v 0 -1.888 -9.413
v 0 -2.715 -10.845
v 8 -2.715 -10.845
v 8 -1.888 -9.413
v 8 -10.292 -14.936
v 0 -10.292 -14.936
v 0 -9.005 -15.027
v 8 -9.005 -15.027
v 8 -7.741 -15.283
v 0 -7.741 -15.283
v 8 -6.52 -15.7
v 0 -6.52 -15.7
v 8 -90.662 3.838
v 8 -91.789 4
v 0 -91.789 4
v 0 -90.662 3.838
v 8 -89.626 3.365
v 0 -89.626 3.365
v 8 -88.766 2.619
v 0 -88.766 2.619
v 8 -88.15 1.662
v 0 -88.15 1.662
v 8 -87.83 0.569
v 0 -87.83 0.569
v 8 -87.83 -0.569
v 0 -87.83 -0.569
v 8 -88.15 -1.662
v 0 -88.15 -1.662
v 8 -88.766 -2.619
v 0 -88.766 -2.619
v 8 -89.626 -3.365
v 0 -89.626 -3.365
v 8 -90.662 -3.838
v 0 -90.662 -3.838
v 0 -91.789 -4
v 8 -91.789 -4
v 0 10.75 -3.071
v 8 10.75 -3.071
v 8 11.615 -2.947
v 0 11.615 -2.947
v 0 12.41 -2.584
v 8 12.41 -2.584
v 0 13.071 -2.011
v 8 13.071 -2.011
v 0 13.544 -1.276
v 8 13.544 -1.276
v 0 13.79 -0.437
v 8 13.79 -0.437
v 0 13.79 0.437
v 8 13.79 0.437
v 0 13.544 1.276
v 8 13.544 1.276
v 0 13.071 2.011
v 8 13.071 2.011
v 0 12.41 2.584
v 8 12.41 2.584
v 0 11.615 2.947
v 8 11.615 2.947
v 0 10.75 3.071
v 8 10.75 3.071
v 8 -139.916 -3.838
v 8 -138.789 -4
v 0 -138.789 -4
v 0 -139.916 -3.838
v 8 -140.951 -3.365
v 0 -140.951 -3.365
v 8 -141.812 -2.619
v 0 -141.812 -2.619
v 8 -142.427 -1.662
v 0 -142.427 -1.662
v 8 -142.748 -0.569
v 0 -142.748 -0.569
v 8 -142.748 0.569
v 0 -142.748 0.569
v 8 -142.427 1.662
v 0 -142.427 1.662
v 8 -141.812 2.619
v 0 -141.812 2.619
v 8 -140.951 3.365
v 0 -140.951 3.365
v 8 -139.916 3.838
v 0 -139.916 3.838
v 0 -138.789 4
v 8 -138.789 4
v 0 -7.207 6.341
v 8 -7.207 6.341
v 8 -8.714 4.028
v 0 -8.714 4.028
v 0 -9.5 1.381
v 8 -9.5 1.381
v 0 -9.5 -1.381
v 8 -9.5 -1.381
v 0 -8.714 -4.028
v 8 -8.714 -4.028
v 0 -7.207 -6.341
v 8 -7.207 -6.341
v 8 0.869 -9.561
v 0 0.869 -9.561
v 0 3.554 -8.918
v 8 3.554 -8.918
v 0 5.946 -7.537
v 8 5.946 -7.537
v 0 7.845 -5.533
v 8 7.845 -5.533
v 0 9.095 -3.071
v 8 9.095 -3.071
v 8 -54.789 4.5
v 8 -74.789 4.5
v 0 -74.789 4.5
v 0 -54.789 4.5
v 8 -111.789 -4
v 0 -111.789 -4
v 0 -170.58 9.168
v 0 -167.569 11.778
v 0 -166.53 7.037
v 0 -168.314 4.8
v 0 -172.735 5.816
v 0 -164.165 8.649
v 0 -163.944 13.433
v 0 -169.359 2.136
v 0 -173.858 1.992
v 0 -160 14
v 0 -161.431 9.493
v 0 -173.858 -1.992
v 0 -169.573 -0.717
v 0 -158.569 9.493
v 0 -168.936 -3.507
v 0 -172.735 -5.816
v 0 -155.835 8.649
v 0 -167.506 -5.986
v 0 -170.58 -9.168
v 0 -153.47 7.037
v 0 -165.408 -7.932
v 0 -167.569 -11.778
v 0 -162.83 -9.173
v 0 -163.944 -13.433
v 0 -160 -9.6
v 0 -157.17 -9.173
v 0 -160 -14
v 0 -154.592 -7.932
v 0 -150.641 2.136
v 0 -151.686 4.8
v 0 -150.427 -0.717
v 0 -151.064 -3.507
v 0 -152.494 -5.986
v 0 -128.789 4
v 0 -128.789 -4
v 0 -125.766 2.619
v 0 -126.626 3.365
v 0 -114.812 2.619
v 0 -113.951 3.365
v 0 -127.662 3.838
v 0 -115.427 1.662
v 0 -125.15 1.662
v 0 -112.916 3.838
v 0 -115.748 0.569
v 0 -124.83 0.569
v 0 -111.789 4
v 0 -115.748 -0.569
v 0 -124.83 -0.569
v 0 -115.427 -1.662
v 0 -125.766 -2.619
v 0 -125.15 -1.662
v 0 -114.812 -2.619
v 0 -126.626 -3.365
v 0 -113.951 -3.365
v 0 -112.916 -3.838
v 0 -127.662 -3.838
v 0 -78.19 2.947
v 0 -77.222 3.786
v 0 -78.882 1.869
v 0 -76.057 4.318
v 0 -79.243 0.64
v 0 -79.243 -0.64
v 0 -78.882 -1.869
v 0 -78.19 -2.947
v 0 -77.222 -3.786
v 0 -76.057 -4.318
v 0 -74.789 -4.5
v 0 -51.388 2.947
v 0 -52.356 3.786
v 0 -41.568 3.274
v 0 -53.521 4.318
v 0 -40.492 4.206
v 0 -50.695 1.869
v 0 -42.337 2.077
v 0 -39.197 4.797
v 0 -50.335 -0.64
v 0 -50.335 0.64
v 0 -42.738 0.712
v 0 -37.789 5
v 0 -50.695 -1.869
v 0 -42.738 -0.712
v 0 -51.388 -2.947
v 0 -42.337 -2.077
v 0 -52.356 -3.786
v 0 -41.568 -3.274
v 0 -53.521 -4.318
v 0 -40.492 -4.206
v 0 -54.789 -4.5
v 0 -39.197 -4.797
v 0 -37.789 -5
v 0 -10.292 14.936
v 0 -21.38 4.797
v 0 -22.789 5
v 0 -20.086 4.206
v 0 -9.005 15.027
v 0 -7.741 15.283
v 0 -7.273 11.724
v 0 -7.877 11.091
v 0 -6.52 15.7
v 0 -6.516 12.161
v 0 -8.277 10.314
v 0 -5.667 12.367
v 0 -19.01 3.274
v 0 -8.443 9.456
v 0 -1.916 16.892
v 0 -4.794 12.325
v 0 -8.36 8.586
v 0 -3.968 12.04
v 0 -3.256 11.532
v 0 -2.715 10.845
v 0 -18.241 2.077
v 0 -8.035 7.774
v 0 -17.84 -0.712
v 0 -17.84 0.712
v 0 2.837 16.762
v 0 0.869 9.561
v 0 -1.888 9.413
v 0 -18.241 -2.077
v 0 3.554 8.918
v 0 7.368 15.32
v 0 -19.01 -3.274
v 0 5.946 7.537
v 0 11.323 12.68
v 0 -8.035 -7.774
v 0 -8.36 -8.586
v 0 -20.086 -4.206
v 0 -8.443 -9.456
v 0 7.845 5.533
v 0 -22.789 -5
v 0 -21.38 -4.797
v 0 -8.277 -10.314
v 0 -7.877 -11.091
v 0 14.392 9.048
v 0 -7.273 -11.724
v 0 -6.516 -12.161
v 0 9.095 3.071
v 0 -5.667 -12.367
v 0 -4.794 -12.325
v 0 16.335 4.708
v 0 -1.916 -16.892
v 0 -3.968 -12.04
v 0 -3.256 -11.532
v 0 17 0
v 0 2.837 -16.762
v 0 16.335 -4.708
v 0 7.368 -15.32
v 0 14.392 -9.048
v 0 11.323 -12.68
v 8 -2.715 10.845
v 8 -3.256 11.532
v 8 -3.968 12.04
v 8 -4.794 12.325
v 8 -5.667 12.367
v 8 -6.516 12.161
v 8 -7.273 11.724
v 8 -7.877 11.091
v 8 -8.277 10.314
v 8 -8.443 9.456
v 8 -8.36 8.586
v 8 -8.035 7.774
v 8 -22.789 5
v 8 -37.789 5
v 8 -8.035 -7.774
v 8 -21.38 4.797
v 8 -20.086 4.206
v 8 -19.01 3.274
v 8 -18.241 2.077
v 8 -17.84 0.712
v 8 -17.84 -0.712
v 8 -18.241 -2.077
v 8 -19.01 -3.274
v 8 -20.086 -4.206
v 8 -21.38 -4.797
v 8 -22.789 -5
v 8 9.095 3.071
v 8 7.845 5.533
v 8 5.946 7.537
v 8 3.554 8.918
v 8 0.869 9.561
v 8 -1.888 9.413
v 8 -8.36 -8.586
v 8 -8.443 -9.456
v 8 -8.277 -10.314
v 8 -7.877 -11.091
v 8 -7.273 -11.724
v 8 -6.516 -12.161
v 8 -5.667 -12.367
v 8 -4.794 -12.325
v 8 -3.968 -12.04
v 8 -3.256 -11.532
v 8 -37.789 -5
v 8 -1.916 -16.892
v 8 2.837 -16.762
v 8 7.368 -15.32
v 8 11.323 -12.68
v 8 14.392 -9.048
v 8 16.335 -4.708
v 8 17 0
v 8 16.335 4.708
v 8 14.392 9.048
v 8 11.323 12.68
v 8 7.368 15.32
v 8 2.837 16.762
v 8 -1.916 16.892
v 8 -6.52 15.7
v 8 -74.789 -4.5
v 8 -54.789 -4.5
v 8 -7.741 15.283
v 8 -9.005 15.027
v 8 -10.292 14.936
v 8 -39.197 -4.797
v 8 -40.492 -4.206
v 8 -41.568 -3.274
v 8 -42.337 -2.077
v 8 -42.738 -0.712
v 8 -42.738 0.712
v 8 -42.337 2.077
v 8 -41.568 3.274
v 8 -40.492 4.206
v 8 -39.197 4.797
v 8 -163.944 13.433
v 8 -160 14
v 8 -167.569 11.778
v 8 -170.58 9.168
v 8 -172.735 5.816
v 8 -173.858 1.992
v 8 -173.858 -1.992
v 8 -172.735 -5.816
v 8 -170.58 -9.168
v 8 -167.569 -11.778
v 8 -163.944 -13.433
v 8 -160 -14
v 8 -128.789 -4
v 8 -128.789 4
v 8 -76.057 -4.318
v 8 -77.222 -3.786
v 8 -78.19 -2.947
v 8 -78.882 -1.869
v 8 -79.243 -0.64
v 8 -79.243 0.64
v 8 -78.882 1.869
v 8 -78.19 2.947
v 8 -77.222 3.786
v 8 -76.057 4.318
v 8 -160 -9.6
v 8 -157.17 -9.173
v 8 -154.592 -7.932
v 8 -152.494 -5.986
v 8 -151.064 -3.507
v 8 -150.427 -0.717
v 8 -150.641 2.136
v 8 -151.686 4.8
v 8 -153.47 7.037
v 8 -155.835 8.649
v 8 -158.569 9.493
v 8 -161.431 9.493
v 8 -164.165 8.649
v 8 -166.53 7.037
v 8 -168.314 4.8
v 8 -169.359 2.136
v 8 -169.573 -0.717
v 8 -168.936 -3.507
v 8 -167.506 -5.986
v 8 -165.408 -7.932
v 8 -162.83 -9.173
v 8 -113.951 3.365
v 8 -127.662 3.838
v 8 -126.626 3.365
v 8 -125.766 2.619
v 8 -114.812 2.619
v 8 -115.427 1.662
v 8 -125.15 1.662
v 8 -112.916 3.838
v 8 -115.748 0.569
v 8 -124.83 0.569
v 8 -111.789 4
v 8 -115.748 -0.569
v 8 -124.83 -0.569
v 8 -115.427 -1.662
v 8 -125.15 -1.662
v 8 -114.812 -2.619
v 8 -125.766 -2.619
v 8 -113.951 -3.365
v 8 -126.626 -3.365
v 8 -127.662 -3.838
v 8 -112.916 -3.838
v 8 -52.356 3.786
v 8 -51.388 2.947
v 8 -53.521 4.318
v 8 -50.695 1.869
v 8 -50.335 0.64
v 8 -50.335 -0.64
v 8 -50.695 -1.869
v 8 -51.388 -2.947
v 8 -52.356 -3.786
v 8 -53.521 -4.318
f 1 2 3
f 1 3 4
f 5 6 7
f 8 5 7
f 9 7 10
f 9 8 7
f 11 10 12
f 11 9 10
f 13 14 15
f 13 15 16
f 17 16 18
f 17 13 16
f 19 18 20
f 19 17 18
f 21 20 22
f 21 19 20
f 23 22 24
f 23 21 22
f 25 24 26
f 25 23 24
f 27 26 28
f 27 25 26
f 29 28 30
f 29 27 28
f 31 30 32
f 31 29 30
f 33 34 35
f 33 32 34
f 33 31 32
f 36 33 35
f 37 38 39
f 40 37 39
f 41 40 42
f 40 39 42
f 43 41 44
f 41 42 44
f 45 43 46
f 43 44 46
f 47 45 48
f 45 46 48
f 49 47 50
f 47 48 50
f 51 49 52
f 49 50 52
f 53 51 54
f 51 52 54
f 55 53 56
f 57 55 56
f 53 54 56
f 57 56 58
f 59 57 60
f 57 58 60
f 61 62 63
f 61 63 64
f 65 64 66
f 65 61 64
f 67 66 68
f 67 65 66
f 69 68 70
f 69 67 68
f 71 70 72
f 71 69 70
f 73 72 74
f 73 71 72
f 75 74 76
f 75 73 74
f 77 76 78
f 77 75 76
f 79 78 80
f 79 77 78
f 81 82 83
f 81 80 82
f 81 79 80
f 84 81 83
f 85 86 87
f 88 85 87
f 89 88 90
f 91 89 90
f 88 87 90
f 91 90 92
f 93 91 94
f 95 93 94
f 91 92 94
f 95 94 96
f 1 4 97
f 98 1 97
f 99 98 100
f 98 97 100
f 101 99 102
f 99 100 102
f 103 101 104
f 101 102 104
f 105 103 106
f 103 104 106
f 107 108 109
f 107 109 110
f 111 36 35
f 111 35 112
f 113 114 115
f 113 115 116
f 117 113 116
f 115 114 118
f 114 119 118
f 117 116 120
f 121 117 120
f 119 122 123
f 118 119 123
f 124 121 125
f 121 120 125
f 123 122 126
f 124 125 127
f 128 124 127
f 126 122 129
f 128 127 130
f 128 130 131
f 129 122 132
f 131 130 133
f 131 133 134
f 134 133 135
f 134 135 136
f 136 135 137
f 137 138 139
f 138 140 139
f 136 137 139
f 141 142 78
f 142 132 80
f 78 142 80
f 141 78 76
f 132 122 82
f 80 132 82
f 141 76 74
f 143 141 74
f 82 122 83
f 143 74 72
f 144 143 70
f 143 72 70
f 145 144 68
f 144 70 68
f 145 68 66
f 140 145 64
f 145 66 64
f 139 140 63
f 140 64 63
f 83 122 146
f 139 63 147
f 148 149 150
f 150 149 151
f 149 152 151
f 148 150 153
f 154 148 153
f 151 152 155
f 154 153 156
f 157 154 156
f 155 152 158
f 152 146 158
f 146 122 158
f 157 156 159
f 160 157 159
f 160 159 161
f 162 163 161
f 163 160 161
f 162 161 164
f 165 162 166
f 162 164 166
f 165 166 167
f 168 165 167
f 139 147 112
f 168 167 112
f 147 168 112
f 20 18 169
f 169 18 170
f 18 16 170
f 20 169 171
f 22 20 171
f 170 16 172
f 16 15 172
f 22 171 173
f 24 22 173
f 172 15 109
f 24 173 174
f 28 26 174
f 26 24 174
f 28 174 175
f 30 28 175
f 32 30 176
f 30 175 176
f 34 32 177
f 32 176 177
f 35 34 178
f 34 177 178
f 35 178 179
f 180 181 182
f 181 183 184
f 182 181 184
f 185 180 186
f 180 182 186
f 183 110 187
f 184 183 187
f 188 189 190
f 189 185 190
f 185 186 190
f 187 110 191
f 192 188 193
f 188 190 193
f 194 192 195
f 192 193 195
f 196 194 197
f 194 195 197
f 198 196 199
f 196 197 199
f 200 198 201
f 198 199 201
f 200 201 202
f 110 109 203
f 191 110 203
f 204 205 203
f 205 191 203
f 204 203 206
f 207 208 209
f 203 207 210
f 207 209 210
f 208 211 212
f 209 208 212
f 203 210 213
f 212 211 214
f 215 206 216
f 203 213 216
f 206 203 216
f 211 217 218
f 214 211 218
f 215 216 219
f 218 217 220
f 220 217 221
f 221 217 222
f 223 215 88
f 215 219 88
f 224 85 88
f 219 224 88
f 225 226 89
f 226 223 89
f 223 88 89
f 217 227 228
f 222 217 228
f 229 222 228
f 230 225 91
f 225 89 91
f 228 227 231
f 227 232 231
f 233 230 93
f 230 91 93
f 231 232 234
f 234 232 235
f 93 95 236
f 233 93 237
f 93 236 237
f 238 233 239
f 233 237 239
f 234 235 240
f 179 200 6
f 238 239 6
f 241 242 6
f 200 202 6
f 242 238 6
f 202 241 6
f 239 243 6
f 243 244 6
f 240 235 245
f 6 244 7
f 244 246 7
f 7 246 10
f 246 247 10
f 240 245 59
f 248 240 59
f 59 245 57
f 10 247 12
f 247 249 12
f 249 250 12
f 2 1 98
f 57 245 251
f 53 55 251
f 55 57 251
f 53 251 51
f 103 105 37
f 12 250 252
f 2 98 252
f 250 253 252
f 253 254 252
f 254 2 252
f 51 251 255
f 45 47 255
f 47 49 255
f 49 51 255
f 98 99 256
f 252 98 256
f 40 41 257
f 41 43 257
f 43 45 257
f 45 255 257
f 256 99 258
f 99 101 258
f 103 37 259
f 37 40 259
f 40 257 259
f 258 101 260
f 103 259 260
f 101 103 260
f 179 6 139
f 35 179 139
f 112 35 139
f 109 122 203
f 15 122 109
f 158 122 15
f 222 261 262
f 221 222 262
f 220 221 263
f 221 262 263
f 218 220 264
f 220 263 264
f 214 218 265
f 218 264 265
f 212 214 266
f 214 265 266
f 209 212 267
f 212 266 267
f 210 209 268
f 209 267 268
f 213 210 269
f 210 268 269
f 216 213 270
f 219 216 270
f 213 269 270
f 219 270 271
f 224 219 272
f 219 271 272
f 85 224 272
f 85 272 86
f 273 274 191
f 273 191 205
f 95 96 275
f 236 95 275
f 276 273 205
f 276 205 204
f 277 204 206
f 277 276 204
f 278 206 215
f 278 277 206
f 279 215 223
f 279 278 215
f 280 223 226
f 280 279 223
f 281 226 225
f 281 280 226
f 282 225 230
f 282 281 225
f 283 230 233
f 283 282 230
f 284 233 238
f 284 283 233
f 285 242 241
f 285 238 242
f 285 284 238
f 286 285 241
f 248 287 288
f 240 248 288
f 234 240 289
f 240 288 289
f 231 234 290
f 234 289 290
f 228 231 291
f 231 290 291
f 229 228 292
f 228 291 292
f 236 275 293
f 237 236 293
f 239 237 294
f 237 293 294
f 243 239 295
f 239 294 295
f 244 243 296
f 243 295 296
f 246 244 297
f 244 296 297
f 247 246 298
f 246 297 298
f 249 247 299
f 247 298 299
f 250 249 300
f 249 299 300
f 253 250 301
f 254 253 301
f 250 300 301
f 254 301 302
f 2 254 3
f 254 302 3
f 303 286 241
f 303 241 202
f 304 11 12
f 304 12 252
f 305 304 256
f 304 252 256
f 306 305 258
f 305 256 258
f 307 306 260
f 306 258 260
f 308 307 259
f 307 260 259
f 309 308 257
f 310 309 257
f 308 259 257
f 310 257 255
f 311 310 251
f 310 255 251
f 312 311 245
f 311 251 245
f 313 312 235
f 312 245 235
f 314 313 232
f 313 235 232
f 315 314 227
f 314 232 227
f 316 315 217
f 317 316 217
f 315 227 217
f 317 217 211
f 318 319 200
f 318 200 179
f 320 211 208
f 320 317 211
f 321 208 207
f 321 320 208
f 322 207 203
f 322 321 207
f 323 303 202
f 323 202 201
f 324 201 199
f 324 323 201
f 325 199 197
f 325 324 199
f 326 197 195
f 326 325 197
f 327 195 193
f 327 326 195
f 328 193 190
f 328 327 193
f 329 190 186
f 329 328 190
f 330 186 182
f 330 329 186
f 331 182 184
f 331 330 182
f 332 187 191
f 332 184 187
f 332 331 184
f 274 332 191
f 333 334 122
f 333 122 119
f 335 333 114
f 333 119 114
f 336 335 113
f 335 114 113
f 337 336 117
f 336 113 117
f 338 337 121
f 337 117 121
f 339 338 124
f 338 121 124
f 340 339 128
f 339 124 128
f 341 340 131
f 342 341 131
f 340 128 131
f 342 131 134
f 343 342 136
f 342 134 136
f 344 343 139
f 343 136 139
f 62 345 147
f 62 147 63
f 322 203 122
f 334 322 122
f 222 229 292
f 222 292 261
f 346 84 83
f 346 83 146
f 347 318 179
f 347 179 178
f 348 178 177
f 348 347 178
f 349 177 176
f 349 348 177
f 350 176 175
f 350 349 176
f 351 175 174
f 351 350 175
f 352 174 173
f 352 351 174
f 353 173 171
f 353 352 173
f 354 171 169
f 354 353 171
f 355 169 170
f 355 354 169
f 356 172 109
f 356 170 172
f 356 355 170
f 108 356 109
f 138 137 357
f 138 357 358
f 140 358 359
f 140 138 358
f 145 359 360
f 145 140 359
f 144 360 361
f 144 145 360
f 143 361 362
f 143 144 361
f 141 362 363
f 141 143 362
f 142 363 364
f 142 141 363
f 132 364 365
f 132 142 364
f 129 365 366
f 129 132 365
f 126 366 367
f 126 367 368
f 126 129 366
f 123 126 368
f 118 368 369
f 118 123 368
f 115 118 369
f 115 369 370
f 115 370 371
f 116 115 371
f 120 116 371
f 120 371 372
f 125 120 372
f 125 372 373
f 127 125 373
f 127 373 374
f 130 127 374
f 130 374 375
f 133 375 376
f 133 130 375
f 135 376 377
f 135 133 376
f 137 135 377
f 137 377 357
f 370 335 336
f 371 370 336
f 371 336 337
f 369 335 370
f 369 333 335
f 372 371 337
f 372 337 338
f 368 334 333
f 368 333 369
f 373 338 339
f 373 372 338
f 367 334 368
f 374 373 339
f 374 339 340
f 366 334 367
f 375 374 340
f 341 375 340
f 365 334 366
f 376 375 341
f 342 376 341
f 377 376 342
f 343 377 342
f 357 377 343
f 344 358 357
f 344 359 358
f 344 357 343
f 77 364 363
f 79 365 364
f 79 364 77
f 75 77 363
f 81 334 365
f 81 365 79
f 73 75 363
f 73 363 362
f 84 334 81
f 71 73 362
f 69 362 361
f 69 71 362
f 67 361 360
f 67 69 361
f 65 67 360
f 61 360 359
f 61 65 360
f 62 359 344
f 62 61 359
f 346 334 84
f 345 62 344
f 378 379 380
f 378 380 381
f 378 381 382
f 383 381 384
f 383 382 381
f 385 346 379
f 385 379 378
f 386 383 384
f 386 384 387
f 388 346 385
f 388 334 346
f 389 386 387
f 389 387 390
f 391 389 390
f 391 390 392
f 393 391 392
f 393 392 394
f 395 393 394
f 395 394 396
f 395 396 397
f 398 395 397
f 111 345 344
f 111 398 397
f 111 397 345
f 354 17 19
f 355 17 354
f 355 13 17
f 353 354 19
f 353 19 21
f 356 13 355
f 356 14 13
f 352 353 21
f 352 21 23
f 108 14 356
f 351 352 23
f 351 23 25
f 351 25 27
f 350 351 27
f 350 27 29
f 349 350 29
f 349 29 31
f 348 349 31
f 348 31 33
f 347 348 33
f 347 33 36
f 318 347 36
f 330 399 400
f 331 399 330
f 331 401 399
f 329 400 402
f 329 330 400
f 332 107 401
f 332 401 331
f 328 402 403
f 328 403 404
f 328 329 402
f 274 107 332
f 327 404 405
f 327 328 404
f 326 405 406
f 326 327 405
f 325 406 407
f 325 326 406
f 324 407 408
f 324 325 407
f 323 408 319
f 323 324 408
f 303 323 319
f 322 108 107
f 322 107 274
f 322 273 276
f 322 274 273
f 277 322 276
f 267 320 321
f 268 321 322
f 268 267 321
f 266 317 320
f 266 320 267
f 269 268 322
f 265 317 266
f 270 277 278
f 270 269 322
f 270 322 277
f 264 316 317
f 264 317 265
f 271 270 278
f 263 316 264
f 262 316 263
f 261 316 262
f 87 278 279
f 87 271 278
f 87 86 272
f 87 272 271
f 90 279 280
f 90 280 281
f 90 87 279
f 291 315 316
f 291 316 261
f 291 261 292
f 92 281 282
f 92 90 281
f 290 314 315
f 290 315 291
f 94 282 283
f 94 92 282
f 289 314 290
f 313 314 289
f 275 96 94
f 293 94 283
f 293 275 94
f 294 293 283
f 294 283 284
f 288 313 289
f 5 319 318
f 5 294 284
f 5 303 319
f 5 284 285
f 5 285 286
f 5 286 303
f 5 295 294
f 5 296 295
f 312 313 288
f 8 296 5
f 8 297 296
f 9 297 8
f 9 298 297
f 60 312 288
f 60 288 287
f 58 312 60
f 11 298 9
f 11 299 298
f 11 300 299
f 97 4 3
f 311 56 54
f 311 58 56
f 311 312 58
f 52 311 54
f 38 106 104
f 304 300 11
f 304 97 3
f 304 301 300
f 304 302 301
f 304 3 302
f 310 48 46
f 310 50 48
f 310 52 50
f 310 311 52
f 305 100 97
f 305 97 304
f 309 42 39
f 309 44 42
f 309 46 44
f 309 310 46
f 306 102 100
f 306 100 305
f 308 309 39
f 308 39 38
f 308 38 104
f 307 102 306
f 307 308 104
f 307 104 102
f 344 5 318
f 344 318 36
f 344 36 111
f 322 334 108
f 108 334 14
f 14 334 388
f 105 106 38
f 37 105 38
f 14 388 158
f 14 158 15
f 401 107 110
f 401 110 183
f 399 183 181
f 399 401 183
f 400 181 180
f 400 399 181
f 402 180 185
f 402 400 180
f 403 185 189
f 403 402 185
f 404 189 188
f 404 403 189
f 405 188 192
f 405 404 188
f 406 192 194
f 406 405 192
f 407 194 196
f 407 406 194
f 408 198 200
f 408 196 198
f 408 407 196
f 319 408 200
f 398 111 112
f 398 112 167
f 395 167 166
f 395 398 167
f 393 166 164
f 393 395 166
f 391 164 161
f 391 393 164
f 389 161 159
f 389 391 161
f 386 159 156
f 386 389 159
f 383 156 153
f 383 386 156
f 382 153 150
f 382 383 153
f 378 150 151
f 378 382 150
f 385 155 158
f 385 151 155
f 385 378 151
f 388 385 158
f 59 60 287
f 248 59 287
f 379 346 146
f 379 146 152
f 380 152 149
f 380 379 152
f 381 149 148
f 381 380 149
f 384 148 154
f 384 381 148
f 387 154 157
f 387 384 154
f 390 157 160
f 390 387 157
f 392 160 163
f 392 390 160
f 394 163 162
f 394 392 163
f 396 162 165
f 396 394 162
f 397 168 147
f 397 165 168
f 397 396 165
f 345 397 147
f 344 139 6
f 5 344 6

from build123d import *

# Parameters (mm, degrees)
SKETCH_3_R          = 9.6
EXTRUDE_1_DEPTH     = 8
CUT_EXTRUDE_3_DEPTH = 10
FILLET_1_R          = 10
CUT_EXTRUDE_4_DEPTH = 10


with BuildPart() as part:
    # 草图3 → 凸台-拉伸1 (new body)
    with BuildSketch(Plane(origin=(0, 0, 0), x_dir=(0, 0, -1), z_dir=(1, 0, 0))):
        with BuildLine():
            Line((14, -160), (14.949411629, -8.094139358))
            ThreePointArc((14.949411629, -8.094139358), (0, 17), (-14.949411629, -8.094139358))
            Line((-14.949411629, -8.094139358), (-14, -160))
            ThreePointArc((-14, -160), (0, -174), (14, -160))
        make_face()
        with Locations((0, -160)):
            Circle(SKETCH_3_R, mode=Mode.SUBTRACT)
    extrude(amount=EXTRUDE_1_DEPTH)

    # 草图6 → 切除-拉伸3 (cut)
    with BuildSketch(Plane(origin=(8, 0, 0), x_dir=(0, 0, -1), z_dir=(1, 0, 0))):
        with BuildLine():
            Line((5, -22.788825977), (5, -37.788825977))
            ThreePointArc((5, -37.788825977), (0, -42.788825977), (-5, -37.788825977))
            Line((-5, -37.788825977), (-5, -22.788825977))
            ThreePointArc((-5, -22.788825977), (0, -17.788825977), (5, -22.788825977))
        make_face()
        with BuildLine():
            Line((4.5, -54.788825977), (4.5, -74.788825977))
            ThreePointArc((4.5, -74.788825977), (0, -79.288825977), (-4.5, -74.788825977))
            Line((-4.5, -74.788825977), (-4.5, -54.788825977))
            ThreePointArc((-4.5, -54.788825977), (0, -50.288825977), (4.5, -54.788825977))
        make_face()
        with BuildLine():
            Line((4, -91.788825977), (4, -111.788825977))
            ThreePointArc((4, -111.788825977), (0, -115.788825977), (-4, -111.788825977))
            Line((-4, -111.788825977), (-4, -91.788825977))
            ThreePointArc((-4, -91.788825977), (0, -87.788825977), (4, -91.788825977))
        make_face()
        with BuildLine():
            Line((4, -128.788825977), (4, -138.788825977))
            ThreePointArc((4, -138.788825977), (0, -142.788825977), (-4, -138.788825977))
            Line((-4, -138.788825977), (-4, -128.788825977))
            ThreePointArc((-4, -128.788825977), (0, -124.788825977), (4, -128.788825977))
        make_face()
    extrude(amount=-CUT_EXTRUDE_3_DEPTH, mode=Mode.SUBTRACT)

    # 圆角1
    fillet_1_edges = [part.edges().sort_by_distance(p)[0] for p in [
        (4, -8.094139358, 14.949411629),
        (4, -8.094139358, -14.949411629),
    ]]
    fillet(fillet_1_edges, radius=FILLET_1_R)

    # 草图4 → 切除-拉伸4 (cut)
    with BuildSketch(Plane(origin=(8, 0, 0), x_dir=(0, 0, -1), z_dir=(1, 0, 0))):
        with BuildLine():
            Line((-3.071192312, 10.75), (-3.071192312, 9.095481174))
            ThreePointArc((-3.071192312, 9.095481174), (-8.313843876, 4.8), (-9.412513912, -1.888010025))
            Line((-9.412513912, -1.888010025), (-10.845369247, -2.715269438))
            ThreePointArc((-10.845369247, -2.715269438), (-11.969503653, -6.910596156), (-7.774176935, -8.034730562))
            Line((-7.774176935, -8.034730562), (-6.3413216, -7.207471149))
            ThreePointArc((-6.3413216, -7.207471149), (0, -9.6), (6.3413216, -7.207471149))
            Line((6.3413216, -7.207471149), (7.774176935, -8.034730562))
            ThreePointArc((7.774176935, -8.034730562), (11.969503653, -6.910596156), (10.845369247, -2.715269438))
            Line((10.845369247, -2.715269438), (9.412513912, -1.888010025))
            ThreePointArc((9.412513912, -1.888010025), (8.313843876, 4.8), (3.071192312, 9.095481174))
            Line((3.071192312, 9.095481174), (3.071192312, 10.75))
            ThreePointArc((3.071192312, 10.75), (0, 13.821192312), (-3.071192312, 10.75))
        make_face()
    extrude(amount=-CUT_EXTRUDE_4_DEPTH, mode=Mode.SUBTRACT)


solid = part.part
